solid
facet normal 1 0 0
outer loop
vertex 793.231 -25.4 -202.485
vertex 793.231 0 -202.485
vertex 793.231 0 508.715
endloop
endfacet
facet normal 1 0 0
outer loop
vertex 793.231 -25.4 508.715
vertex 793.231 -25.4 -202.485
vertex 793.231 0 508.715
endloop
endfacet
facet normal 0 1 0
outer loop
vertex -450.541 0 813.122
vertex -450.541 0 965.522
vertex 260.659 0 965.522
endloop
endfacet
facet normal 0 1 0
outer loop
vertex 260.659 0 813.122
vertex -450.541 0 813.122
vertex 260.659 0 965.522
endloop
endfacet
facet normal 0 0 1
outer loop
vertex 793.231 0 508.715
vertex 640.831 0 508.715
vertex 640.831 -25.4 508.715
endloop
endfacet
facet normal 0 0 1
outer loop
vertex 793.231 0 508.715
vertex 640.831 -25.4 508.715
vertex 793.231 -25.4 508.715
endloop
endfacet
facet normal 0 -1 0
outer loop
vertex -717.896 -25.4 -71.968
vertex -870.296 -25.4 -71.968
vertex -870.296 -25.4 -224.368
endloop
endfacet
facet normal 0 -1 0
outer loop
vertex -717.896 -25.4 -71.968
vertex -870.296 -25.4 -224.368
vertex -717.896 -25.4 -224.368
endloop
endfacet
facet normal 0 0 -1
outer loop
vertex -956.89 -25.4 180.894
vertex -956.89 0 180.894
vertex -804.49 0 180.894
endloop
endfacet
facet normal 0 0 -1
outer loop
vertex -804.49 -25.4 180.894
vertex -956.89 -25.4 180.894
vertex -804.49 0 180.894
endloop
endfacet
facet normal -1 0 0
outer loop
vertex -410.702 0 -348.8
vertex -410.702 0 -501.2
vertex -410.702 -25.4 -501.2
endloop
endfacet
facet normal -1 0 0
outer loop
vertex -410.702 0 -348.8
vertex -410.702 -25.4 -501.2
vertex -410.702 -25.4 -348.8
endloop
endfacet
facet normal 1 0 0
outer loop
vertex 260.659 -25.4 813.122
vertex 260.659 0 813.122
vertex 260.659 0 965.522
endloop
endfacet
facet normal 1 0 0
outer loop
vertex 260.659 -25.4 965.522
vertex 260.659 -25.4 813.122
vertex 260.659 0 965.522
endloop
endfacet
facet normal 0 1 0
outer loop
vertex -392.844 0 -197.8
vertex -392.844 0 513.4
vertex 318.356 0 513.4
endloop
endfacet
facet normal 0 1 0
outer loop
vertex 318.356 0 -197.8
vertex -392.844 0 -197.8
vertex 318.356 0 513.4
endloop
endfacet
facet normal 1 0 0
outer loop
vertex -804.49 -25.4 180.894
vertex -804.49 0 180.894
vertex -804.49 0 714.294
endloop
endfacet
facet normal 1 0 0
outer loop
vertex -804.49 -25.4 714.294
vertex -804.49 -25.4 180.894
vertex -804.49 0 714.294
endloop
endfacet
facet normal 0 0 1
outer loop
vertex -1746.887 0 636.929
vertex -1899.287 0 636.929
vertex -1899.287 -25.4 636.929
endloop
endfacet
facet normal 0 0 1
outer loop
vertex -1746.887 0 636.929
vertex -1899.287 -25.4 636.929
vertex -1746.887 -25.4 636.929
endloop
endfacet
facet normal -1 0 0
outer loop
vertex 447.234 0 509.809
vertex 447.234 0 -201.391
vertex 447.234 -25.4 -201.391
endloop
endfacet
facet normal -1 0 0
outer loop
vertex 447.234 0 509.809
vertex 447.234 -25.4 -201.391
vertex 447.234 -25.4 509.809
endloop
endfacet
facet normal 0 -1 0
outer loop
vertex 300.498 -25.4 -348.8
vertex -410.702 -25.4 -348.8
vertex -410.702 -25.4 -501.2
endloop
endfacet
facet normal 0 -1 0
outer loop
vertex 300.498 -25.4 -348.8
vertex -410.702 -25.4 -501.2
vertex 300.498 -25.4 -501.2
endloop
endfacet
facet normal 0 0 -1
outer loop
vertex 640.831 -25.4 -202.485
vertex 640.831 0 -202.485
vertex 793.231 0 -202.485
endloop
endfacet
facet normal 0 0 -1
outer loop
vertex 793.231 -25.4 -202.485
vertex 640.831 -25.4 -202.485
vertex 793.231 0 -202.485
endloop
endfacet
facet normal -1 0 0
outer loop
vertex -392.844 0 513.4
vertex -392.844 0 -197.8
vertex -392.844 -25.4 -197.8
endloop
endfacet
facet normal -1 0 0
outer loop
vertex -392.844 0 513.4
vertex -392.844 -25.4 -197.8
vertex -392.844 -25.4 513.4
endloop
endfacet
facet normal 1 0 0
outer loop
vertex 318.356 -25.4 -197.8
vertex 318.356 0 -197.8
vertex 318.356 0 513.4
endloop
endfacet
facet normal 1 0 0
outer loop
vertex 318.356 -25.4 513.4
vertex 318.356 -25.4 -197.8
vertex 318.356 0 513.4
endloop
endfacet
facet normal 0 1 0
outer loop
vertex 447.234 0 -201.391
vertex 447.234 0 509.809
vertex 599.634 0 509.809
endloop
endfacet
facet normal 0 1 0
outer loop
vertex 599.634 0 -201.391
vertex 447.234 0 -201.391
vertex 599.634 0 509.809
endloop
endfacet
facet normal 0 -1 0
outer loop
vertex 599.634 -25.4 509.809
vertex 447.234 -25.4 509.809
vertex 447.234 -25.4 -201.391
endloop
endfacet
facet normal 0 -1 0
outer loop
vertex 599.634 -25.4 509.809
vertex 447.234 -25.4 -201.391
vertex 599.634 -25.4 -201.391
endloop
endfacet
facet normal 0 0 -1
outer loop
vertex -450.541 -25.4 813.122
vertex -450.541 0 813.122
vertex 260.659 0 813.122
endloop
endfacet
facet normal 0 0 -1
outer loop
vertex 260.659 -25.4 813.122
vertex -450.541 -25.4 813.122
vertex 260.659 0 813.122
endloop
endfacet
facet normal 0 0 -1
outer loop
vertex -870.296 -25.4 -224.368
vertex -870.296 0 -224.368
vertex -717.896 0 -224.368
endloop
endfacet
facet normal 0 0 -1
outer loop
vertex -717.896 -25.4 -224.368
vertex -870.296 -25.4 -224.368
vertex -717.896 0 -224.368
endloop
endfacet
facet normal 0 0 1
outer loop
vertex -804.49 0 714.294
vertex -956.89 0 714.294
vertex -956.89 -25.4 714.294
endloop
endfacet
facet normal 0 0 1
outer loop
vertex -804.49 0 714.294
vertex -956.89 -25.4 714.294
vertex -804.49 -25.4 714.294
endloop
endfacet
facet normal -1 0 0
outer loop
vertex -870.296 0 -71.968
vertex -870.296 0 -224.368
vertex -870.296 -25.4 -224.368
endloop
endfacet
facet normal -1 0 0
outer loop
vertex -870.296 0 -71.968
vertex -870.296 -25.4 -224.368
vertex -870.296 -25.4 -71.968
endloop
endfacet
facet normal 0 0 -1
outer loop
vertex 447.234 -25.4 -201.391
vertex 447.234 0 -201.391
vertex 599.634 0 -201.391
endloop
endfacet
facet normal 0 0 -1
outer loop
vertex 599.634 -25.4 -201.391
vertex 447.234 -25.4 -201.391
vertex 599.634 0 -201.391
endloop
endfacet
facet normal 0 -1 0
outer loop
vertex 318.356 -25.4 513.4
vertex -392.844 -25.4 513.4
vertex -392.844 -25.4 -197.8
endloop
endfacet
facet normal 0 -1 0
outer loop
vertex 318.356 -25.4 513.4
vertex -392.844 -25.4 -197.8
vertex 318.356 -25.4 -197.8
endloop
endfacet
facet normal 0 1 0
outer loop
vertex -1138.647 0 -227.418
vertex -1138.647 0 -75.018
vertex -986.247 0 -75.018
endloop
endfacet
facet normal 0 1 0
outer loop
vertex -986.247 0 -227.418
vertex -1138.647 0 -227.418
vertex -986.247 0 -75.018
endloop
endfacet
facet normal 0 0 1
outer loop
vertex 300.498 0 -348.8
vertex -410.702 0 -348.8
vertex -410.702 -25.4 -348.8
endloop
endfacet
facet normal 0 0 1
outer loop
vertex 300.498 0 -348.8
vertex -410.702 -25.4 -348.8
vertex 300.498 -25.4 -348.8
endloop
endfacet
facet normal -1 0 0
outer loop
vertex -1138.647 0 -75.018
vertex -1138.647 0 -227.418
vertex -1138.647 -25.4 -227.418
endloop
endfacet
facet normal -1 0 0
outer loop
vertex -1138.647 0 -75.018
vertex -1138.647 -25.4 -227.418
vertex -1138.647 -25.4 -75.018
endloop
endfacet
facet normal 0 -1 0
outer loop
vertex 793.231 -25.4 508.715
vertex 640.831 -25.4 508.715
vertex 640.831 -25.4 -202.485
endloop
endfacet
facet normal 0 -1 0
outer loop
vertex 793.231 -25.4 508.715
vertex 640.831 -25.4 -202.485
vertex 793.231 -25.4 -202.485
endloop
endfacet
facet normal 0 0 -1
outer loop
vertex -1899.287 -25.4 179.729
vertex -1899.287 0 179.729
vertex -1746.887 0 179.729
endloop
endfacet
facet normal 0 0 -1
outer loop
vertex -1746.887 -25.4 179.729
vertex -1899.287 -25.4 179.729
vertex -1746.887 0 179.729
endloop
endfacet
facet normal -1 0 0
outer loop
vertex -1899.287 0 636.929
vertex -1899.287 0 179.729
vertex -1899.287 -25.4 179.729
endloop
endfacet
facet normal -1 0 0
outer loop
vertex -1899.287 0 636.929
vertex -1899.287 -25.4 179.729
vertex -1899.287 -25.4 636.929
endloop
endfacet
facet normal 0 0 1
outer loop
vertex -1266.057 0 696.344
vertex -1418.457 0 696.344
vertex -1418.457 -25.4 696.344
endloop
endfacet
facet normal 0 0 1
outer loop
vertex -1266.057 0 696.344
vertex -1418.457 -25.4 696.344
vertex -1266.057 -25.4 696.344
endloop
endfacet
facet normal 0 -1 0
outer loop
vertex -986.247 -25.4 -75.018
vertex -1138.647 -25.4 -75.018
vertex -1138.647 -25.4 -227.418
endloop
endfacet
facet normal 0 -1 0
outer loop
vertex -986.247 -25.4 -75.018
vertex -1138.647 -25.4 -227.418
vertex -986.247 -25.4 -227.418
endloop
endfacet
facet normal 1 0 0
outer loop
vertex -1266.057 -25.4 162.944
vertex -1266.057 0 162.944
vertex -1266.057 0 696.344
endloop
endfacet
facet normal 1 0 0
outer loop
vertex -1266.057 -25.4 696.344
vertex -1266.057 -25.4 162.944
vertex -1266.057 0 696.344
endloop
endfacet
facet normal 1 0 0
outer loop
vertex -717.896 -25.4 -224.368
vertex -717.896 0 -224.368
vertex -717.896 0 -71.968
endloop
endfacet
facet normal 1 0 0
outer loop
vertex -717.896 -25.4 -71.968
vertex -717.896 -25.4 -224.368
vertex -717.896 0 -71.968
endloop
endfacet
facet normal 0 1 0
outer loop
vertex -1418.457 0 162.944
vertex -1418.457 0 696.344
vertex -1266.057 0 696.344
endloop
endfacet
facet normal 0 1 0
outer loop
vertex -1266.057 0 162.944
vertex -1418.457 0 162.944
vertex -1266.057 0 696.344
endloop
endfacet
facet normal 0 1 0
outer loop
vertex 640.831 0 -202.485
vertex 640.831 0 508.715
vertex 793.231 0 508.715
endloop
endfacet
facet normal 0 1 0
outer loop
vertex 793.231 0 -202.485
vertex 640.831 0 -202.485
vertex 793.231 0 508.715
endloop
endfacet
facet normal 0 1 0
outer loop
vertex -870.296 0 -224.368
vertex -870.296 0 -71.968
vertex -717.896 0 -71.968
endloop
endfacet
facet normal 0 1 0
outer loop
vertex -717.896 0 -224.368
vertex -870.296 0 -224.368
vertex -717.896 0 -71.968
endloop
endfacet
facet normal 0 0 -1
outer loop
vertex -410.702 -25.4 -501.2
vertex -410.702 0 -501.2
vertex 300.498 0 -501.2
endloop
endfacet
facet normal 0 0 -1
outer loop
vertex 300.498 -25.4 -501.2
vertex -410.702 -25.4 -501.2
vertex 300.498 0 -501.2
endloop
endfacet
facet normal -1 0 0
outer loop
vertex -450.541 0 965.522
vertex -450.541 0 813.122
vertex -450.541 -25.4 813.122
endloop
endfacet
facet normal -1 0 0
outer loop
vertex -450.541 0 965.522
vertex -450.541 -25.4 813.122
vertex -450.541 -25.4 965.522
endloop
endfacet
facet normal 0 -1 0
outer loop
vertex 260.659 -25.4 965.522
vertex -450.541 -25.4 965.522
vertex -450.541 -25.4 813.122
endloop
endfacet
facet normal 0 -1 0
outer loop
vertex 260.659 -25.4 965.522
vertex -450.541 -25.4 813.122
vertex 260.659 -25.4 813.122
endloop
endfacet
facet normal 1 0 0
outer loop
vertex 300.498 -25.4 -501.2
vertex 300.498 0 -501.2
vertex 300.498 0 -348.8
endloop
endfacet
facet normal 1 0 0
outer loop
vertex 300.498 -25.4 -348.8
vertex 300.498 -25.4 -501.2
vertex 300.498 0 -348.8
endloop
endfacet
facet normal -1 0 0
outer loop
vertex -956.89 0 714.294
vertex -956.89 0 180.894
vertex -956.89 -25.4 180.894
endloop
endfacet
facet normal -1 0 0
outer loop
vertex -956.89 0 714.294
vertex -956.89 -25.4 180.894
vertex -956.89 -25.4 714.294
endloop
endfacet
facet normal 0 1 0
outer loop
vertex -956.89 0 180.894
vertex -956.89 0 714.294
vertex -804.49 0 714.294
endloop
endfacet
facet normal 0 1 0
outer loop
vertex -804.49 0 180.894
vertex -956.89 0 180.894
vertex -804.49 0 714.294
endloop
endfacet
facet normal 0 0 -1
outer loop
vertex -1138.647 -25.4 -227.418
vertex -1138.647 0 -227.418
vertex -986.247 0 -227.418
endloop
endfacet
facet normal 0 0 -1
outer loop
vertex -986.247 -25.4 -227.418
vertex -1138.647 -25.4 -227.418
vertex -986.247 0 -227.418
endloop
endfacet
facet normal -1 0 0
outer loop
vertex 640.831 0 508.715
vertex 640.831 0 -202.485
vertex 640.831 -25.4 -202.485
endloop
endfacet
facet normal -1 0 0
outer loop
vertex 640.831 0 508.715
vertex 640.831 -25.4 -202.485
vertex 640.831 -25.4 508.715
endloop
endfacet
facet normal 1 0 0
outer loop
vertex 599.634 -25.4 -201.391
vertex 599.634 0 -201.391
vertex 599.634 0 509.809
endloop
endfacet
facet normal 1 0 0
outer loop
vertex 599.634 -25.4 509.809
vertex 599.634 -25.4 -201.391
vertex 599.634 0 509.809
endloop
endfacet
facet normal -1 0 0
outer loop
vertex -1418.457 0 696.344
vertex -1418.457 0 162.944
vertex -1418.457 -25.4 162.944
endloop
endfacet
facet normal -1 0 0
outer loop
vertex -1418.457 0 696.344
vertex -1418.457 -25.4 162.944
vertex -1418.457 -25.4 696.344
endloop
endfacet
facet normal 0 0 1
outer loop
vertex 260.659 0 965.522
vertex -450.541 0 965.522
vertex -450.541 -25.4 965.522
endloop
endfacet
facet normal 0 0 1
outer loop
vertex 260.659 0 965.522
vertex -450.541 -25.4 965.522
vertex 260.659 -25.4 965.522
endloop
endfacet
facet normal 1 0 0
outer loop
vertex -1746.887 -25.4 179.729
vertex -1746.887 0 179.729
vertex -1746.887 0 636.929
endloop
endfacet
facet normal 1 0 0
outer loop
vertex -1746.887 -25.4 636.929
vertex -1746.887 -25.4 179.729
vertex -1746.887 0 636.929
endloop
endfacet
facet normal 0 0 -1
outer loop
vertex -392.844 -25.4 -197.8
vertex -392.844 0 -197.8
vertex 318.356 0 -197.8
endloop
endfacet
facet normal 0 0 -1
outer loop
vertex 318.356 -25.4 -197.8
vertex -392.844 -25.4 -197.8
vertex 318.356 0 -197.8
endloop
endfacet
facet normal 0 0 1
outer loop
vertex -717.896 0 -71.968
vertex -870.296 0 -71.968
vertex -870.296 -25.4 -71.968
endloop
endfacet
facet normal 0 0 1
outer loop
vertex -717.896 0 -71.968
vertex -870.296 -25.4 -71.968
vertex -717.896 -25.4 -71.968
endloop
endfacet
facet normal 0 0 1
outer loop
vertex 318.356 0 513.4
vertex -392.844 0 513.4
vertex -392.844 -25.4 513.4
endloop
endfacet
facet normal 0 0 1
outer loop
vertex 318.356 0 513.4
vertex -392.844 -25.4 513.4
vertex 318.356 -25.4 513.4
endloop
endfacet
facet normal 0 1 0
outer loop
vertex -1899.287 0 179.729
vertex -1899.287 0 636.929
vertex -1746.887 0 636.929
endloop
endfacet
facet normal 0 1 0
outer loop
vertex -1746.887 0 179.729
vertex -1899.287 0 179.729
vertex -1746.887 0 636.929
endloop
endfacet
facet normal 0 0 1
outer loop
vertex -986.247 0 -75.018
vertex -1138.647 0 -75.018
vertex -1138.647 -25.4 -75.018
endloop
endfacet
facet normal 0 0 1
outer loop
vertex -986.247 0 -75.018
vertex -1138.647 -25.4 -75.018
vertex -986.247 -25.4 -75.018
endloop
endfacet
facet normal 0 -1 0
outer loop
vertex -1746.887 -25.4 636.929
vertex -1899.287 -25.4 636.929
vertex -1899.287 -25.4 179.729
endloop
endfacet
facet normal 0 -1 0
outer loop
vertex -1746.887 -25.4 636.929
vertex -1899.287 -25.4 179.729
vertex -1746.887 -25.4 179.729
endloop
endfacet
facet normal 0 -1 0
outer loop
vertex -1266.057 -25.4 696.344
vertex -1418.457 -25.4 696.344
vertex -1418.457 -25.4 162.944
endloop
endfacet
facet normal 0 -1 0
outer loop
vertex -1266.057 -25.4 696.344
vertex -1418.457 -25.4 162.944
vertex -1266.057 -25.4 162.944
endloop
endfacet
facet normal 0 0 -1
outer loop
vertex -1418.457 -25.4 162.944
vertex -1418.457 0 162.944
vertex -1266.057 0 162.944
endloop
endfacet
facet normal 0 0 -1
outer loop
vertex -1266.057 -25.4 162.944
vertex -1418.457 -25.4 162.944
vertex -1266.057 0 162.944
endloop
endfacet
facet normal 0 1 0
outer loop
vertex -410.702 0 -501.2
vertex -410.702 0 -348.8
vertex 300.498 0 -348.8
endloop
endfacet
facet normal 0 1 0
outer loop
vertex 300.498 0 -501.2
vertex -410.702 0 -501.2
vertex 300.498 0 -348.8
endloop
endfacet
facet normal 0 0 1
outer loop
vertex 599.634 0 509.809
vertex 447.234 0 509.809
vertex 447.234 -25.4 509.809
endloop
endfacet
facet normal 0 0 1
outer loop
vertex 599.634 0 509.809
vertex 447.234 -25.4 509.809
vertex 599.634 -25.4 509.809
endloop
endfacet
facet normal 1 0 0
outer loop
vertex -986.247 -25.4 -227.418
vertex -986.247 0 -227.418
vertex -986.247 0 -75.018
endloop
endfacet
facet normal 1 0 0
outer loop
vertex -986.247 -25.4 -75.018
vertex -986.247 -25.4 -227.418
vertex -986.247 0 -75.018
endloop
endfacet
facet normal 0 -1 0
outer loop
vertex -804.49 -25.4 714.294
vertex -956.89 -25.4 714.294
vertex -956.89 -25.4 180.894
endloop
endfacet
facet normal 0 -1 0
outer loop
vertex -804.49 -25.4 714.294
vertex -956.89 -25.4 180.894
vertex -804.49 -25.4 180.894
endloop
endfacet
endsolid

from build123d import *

# Parameters (mm, degrees)
F0_W     = 152.4
F0_H     = 457.2
F0_H_2   = 533.4
F0_W_2   = 711.2
F0_H_3   = 152.4
F0_H_4   = 711.2
F1_DEPTH = 25.4


with BuildPart() as f1:
    # F0 (on Front) → F1 (new body)
    with BuildSketch(Plane.XZ):
        with Locations((-1823.087224, 408.328895)):
            Rectangle(F0_W, F0_H)
        with Locations((-1342.256674, 429.644287)):
            Rectangle(F0_W, F0_H_2)
        with Locations((-880.68951, 447.594122)):
            Rectangle(F0_W, F0_H_2)
        with Locations((-94.941437, 889.322153)):
            Rectangle(F0_W_2, F0_H_3)
        with Locations((-37.243866, 157.800074)):
            Rectangle(F0_W_2, F0_H_4)
        with Locations((-55.101662, -424.999603)):
            Rectangle(F0_W_2, F0_H_3)
        with Locations((-794.09624, -148.168319)):
            Rectangle(F0_W, F0_H_3)
        with Locations((-1062.446841, -151.217752)):
            Rectangle(F0_W, F0_H_3)
        with Locations((523.433588, 154.208541)):
            Rectangle(F0_W, F0_H_4)
        with Locations((717.030517, 153.114796)):
            Rectangle(F0_W, F0_H_4)
    extrude(amount=F1_DEPTH)


solid = f1.part
